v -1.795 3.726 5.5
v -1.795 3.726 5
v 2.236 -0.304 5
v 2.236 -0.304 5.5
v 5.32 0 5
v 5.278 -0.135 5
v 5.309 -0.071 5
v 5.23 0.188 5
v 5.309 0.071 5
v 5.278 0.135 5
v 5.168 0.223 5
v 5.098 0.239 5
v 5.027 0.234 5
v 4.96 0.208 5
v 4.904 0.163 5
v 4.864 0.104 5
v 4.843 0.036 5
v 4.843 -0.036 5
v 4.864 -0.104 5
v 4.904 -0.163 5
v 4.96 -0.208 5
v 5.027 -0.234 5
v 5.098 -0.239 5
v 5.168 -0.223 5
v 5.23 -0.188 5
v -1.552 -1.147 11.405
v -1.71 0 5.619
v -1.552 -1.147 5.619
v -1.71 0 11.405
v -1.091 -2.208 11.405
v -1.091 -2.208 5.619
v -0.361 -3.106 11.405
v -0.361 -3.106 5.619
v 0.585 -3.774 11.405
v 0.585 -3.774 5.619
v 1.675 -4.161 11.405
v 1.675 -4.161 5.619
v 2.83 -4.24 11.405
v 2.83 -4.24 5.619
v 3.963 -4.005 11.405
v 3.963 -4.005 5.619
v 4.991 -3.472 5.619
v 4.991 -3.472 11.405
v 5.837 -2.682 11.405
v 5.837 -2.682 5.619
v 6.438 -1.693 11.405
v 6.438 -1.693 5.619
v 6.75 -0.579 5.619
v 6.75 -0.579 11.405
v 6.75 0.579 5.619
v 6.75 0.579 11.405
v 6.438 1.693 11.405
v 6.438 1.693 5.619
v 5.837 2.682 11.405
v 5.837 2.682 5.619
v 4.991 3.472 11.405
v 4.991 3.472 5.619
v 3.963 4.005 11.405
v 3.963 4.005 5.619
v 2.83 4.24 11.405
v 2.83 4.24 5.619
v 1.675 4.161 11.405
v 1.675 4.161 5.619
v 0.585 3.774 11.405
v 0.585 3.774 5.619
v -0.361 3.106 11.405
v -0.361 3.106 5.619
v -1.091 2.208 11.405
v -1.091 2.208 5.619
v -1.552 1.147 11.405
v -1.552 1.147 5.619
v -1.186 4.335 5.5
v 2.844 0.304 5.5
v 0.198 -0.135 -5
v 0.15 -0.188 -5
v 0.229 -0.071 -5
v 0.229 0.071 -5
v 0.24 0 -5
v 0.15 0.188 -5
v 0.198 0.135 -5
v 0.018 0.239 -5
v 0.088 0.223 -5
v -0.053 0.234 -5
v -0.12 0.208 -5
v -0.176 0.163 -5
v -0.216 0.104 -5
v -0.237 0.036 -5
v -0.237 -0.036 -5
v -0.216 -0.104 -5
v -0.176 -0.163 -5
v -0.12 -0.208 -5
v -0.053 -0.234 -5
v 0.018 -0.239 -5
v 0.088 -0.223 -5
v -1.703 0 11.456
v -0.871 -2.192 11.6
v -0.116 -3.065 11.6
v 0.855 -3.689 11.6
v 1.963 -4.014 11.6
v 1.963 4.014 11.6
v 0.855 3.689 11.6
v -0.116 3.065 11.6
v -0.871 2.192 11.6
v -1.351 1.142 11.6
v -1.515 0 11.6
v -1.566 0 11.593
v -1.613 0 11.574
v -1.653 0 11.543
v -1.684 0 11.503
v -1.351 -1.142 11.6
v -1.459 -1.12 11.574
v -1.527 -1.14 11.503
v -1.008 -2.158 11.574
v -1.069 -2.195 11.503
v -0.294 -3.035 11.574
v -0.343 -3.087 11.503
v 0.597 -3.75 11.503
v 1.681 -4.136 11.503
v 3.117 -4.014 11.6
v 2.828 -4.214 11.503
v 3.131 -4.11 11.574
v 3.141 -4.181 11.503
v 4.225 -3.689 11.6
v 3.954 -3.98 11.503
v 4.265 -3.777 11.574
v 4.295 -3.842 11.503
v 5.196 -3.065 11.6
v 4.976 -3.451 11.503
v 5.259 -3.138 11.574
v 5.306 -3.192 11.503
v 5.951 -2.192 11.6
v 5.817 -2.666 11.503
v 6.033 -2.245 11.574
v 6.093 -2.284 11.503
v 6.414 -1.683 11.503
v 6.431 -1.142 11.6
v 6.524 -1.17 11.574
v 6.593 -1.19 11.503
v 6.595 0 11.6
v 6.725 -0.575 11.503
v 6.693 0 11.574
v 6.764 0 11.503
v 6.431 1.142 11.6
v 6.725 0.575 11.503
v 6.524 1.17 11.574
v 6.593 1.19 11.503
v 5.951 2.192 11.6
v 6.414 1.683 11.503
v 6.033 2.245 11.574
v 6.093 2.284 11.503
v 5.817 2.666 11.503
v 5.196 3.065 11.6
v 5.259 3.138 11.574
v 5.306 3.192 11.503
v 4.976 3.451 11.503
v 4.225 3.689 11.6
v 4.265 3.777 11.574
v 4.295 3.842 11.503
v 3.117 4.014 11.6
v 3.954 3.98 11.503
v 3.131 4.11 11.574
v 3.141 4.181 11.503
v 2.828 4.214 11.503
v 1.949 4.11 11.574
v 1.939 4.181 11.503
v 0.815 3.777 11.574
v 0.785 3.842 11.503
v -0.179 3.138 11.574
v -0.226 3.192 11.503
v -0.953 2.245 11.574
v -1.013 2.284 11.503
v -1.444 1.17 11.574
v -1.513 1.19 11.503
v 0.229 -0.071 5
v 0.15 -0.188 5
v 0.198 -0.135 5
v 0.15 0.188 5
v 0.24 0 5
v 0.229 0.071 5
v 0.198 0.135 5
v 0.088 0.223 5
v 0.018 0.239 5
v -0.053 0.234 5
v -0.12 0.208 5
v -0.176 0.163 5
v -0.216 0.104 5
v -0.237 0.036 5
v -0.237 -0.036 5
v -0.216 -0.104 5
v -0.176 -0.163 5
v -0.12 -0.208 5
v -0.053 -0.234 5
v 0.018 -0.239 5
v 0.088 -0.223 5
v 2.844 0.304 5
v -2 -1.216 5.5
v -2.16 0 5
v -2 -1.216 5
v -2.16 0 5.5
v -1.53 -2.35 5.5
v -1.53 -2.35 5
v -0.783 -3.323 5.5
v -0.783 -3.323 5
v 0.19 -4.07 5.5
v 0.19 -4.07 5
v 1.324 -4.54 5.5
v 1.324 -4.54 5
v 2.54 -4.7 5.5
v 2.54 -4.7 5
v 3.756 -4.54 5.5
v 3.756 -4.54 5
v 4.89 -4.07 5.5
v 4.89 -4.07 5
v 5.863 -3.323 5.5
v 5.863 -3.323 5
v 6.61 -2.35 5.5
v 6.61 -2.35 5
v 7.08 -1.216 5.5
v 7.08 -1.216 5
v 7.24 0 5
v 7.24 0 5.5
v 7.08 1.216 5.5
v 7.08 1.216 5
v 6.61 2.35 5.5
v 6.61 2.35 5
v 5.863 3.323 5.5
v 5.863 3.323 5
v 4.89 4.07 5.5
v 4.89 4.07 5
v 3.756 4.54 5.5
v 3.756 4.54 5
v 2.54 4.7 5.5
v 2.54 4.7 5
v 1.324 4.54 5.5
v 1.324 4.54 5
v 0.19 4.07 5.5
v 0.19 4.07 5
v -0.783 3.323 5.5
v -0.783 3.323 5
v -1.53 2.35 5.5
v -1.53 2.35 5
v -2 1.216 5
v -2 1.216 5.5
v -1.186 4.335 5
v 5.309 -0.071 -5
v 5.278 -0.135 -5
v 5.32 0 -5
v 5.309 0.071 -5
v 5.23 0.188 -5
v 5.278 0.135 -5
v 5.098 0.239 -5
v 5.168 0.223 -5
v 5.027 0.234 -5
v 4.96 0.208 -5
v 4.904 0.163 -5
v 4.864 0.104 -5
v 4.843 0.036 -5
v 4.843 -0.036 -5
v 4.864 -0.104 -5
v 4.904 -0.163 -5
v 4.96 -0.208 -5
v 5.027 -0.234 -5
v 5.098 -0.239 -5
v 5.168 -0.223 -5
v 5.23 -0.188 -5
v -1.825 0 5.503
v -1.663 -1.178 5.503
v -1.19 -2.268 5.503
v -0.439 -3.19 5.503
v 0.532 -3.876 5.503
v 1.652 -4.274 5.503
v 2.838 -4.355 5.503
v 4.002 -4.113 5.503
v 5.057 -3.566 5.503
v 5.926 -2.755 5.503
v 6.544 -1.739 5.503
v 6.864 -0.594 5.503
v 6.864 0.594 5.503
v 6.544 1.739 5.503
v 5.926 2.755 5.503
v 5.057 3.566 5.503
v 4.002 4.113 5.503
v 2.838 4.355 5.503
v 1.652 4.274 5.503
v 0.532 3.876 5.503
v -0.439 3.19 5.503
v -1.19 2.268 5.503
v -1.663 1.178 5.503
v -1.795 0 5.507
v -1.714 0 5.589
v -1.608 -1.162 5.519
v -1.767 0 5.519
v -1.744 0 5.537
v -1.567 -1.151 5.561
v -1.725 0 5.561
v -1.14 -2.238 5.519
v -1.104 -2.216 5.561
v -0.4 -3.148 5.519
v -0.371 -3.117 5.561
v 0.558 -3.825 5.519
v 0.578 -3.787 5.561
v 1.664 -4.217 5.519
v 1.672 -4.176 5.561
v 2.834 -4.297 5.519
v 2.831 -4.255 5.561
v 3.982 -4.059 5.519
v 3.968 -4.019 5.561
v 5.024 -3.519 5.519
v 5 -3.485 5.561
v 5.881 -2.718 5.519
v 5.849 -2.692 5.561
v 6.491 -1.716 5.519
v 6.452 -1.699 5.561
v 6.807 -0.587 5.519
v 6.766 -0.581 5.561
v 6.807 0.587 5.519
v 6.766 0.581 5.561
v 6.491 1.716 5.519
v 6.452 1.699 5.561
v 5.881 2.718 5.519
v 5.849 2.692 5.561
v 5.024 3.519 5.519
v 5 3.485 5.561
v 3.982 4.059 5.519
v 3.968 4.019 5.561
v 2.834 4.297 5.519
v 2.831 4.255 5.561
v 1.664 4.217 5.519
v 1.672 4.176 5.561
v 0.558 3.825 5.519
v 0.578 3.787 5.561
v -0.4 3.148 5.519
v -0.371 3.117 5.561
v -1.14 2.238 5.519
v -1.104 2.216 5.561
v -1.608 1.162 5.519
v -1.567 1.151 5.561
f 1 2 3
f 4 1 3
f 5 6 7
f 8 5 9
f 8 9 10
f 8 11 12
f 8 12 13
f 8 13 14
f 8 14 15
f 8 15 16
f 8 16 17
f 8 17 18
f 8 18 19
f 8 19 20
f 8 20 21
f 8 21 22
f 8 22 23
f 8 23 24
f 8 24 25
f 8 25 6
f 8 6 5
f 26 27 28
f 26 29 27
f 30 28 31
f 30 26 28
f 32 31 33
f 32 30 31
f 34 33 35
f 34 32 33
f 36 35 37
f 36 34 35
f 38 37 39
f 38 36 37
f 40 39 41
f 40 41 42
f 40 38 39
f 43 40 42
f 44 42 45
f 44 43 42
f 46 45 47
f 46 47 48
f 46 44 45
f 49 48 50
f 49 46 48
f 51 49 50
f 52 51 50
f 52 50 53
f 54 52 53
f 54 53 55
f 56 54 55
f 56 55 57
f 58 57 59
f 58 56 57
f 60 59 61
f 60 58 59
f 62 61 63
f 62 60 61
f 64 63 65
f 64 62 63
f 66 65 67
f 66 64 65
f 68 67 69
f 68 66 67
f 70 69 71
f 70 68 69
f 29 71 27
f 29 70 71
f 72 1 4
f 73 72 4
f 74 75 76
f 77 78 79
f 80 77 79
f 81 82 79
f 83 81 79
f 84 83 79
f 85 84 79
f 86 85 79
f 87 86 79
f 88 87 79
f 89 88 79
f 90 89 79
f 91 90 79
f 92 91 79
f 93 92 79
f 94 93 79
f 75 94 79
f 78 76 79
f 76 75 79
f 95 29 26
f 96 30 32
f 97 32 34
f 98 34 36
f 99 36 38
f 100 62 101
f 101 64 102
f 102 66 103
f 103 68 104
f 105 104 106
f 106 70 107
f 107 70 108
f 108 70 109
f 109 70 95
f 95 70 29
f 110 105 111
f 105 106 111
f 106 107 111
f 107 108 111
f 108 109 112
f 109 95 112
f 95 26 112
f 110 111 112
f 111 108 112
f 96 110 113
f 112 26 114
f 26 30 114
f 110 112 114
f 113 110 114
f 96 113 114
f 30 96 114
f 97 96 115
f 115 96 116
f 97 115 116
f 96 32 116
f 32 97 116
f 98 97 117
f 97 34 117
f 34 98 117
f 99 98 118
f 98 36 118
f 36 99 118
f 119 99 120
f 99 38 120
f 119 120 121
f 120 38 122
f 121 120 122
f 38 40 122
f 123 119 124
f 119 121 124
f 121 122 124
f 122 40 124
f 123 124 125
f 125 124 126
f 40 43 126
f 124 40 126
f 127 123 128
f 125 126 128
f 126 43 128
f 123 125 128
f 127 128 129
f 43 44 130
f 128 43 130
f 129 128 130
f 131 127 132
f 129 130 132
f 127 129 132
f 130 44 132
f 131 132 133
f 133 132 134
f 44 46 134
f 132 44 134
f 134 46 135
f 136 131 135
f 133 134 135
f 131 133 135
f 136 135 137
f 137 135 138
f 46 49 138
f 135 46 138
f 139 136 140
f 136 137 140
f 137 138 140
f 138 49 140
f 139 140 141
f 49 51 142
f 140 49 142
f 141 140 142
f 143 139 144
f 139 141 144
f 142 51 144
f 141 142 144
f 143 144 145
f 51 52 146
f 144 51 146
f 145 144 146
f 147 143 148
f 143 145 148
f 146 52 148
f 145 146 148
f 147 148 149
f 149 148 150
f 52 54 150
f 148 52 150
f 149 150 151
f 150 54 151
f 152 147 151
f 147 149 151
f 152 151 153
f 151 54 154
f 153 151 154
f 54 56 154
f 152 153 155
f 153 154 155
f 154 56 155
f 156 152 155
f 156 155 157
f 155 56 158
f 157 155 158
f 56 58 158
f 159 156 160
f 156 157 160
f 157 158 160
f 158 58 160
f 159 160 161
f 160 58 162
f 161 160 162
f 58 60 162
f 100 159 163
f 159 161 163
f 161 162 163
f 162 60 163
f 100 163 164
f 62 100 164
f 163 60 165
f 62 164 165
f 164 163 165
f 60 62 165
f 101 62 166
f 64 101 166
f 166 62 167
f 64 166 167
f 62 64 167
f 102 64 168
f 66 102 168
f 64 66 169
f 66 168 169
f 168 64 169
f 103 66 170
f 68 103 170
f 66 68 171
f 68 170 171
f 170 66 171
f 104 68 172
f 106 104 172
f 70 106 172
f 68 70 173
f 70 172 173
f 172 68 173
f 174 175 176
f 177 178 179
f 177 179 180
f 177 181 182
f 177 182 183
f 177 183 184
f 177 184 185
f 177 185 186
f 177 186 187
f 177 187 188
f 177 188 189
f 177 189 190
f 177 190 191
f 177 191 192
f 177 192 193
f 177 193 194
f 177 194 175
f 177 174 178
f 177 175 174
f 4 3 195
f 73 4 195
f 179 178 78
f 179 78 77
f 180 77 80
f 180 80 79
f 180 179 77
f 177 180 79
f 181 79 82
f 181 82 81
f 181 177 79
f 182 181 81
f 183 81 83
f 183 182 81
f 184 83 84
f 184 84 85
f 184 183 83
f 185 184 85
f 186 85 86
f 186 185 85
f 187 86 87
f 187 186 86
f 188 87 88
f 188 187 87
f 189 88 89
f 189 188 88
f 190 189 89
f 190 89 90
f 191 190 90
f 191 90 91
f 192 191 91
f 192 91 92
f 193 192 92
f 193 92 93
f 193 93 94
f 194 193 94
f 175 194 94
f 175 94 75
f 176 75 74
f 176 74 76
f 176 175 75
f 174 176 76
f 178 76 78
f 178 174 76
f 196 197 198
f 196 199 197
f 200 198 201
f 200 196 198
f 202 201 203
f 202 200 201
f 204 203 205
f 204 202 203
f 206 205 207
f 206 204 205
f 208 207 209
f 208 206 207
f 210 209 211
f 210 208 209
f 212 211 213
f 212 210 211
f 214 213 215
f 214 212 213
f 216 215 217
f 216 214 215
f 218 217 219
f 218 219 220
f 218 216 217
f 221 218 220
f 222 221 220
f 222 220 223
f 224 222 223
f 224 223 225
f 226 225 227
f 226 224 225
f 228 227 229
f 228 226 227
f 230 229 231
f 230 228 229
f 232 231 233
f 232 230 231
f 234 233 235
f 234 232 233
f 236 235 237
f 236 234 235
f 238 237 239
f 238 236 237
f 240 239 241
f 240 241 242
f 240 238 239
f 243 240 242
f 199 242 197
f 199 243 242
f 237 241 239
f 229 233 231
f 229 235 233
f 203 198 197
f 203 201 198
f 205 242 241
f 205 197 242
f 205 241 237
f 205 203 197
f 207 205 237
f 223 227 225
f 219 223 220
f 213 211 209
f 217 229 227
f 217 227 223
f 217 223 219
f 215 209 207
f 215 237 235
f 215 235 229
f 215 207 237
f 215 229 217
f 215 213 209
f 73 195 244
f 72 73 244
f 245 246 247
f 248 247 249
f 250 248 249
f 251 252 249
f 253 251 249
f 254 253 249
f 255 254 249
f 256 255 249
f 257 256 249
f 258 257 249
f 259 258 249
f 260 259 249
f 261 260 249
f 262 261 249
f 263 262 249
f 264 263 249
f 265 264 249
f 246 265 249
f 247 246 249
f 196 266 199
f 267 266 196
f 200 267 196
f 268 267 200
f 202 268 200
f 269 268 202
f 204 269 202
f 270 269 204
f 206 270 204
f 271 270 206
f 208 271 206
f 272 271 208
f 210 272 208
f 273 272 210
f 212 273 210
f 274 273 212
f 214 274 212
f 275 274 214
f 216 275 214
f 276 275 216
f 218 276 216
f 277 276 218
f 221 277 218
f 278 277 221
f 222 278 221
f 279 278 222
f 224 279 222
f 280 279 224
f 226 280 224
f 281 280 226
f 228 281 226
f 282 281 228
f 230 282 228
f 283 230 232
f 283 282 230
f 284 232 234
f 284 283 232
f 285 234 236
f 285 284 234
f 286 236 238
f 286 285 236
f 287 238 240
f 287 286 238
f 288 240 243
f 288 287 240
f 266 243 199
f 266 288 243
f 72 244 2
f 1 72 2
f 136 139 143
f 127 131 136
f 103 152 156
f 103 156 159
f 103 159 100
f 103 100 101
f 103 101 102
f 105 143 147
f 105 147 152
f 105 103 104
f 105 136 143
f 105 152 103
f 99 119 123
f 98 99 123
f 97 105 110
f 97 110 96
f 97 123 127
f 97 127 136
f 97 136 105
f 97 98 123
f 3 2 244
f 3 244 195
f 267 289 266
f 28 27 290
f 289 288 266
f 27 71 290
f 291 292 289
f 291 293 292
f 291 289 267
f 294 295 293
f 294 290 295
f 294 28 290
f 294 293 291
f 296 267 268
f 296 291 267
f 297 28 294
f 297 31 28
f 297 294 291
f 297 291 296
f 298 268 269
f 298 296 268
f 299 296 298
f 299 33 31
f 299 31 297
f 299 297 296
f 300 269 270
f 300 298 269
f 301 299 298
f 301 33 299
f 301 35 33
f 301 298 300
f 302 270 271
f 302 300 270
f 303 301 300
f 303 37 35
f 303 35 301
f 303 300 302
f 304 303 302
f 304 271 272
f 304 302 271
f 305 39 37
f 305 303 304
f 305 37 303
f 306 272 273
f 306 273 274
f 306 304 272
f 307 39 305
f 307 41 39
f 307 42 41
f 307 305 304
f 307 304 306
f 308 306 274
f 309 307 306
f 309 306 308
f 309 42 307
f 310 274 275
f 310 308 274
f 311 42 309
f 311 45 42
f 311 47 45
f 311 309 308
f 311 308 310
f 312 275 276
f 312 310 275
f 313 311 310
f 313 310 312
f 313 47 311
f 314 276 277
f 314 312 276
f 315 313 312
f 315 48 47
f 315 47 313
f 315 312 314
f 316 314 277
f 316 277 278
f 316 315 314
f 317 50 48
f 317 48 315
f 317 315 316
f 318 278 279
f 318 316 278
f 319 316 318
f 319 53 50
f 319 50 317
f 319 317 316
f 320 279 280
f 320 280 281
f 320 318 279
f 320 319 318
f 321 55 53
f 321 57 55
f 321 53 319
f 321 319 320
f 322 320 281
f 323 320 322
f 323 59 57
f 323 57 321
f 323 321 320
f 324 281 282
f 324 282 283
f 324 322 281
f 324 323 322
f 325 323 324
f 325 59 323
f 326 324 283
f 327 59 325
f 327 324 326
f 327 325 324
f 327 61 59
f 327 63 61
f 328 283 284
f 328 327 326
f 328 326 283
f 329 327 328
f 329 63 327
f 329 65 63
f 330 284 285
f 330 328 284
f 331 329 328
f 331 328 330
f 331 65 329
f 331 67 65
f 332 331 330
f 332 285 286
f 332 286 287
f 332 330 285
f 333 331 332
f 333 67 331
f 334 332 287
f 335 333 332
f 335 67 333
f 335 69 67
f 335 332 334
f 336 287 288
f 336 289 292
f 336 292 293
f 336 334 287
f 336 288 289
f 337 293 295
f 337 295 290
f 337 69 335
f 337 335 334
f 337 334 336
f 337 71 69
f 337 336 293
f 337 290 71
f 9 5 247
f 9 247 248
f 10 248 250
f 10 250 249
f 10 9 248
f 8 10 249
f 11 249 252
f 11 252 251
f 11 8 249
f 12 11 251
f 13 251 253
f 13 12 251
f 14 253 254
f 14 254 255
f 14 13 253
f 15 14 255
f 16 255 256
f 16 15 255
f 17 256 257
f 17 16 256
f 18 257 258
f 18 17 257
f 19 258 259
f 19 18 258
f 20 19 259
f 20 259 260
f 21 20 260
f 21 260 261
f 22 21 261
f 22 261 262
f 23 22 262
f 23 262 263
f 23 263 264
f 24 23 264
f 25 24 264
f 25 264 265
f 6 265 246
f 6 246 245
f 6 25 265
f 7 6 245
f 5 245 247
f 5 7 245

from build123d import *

# Parameters (mm, degrees)
SKETCH_R     = 0.24
PAD_DEPTH    = 10
PAD003_DEPTH = 0.5


with BuildPart() as pad:
    # Sketch → Pad (new body)
    with BuildSketch(Plane.XY.offset(5)):
        Circle(SKETCH_R)
        with Locations((5.08, 0)):
            Circle(SKETCH_R)
    extrude(amount=-PAD_DEPTH)


with BuildPart() as revolution:
    # Sketch003 → Revolution (revolve)
    with BuildSketch(Plane.XZ):
        with BuildLine():
            Line((2.54, 5), (-2.16, 5))
            Line((-2.16, 5), (-2.16, 5.5))
            Line((-2.16, 5.5), (-1.82504, 5.502752))
            ThreePointArc((-1.82504, 5.502752), (-1.743637, 5.537059), (-1.71, 5.61874))
            Line((-1.71, 5.61874), (-1.71, 11.405088))
            ThreePointArc((-1.515088, 11.6), (-1.652912, 11.542912), (-1.71, 11.405088))
            Line((-1.515088, 11.6), (2.54, 11.6))
            Line((2.54, 11.6), (2.54, 5))
        make_face()
    revolve(axis=Axis((2.54, 0, 2.550668), (0, 0, 1)))


with BuildPart() as pad003:
    # Sketch004 → Pad003 (new body)
    with BuildSketch(Plane.XY.offset(5)):
        Polygon((2.844056, 0.304056), (-1.186453, 4.334565), (-1.794565, 3.726453), (2.235944, -0.304056), align=None)
    extrude(amount=PAD003_DEPTH)


solid = Compound([pad.part, revolution.part, pad003.part])
